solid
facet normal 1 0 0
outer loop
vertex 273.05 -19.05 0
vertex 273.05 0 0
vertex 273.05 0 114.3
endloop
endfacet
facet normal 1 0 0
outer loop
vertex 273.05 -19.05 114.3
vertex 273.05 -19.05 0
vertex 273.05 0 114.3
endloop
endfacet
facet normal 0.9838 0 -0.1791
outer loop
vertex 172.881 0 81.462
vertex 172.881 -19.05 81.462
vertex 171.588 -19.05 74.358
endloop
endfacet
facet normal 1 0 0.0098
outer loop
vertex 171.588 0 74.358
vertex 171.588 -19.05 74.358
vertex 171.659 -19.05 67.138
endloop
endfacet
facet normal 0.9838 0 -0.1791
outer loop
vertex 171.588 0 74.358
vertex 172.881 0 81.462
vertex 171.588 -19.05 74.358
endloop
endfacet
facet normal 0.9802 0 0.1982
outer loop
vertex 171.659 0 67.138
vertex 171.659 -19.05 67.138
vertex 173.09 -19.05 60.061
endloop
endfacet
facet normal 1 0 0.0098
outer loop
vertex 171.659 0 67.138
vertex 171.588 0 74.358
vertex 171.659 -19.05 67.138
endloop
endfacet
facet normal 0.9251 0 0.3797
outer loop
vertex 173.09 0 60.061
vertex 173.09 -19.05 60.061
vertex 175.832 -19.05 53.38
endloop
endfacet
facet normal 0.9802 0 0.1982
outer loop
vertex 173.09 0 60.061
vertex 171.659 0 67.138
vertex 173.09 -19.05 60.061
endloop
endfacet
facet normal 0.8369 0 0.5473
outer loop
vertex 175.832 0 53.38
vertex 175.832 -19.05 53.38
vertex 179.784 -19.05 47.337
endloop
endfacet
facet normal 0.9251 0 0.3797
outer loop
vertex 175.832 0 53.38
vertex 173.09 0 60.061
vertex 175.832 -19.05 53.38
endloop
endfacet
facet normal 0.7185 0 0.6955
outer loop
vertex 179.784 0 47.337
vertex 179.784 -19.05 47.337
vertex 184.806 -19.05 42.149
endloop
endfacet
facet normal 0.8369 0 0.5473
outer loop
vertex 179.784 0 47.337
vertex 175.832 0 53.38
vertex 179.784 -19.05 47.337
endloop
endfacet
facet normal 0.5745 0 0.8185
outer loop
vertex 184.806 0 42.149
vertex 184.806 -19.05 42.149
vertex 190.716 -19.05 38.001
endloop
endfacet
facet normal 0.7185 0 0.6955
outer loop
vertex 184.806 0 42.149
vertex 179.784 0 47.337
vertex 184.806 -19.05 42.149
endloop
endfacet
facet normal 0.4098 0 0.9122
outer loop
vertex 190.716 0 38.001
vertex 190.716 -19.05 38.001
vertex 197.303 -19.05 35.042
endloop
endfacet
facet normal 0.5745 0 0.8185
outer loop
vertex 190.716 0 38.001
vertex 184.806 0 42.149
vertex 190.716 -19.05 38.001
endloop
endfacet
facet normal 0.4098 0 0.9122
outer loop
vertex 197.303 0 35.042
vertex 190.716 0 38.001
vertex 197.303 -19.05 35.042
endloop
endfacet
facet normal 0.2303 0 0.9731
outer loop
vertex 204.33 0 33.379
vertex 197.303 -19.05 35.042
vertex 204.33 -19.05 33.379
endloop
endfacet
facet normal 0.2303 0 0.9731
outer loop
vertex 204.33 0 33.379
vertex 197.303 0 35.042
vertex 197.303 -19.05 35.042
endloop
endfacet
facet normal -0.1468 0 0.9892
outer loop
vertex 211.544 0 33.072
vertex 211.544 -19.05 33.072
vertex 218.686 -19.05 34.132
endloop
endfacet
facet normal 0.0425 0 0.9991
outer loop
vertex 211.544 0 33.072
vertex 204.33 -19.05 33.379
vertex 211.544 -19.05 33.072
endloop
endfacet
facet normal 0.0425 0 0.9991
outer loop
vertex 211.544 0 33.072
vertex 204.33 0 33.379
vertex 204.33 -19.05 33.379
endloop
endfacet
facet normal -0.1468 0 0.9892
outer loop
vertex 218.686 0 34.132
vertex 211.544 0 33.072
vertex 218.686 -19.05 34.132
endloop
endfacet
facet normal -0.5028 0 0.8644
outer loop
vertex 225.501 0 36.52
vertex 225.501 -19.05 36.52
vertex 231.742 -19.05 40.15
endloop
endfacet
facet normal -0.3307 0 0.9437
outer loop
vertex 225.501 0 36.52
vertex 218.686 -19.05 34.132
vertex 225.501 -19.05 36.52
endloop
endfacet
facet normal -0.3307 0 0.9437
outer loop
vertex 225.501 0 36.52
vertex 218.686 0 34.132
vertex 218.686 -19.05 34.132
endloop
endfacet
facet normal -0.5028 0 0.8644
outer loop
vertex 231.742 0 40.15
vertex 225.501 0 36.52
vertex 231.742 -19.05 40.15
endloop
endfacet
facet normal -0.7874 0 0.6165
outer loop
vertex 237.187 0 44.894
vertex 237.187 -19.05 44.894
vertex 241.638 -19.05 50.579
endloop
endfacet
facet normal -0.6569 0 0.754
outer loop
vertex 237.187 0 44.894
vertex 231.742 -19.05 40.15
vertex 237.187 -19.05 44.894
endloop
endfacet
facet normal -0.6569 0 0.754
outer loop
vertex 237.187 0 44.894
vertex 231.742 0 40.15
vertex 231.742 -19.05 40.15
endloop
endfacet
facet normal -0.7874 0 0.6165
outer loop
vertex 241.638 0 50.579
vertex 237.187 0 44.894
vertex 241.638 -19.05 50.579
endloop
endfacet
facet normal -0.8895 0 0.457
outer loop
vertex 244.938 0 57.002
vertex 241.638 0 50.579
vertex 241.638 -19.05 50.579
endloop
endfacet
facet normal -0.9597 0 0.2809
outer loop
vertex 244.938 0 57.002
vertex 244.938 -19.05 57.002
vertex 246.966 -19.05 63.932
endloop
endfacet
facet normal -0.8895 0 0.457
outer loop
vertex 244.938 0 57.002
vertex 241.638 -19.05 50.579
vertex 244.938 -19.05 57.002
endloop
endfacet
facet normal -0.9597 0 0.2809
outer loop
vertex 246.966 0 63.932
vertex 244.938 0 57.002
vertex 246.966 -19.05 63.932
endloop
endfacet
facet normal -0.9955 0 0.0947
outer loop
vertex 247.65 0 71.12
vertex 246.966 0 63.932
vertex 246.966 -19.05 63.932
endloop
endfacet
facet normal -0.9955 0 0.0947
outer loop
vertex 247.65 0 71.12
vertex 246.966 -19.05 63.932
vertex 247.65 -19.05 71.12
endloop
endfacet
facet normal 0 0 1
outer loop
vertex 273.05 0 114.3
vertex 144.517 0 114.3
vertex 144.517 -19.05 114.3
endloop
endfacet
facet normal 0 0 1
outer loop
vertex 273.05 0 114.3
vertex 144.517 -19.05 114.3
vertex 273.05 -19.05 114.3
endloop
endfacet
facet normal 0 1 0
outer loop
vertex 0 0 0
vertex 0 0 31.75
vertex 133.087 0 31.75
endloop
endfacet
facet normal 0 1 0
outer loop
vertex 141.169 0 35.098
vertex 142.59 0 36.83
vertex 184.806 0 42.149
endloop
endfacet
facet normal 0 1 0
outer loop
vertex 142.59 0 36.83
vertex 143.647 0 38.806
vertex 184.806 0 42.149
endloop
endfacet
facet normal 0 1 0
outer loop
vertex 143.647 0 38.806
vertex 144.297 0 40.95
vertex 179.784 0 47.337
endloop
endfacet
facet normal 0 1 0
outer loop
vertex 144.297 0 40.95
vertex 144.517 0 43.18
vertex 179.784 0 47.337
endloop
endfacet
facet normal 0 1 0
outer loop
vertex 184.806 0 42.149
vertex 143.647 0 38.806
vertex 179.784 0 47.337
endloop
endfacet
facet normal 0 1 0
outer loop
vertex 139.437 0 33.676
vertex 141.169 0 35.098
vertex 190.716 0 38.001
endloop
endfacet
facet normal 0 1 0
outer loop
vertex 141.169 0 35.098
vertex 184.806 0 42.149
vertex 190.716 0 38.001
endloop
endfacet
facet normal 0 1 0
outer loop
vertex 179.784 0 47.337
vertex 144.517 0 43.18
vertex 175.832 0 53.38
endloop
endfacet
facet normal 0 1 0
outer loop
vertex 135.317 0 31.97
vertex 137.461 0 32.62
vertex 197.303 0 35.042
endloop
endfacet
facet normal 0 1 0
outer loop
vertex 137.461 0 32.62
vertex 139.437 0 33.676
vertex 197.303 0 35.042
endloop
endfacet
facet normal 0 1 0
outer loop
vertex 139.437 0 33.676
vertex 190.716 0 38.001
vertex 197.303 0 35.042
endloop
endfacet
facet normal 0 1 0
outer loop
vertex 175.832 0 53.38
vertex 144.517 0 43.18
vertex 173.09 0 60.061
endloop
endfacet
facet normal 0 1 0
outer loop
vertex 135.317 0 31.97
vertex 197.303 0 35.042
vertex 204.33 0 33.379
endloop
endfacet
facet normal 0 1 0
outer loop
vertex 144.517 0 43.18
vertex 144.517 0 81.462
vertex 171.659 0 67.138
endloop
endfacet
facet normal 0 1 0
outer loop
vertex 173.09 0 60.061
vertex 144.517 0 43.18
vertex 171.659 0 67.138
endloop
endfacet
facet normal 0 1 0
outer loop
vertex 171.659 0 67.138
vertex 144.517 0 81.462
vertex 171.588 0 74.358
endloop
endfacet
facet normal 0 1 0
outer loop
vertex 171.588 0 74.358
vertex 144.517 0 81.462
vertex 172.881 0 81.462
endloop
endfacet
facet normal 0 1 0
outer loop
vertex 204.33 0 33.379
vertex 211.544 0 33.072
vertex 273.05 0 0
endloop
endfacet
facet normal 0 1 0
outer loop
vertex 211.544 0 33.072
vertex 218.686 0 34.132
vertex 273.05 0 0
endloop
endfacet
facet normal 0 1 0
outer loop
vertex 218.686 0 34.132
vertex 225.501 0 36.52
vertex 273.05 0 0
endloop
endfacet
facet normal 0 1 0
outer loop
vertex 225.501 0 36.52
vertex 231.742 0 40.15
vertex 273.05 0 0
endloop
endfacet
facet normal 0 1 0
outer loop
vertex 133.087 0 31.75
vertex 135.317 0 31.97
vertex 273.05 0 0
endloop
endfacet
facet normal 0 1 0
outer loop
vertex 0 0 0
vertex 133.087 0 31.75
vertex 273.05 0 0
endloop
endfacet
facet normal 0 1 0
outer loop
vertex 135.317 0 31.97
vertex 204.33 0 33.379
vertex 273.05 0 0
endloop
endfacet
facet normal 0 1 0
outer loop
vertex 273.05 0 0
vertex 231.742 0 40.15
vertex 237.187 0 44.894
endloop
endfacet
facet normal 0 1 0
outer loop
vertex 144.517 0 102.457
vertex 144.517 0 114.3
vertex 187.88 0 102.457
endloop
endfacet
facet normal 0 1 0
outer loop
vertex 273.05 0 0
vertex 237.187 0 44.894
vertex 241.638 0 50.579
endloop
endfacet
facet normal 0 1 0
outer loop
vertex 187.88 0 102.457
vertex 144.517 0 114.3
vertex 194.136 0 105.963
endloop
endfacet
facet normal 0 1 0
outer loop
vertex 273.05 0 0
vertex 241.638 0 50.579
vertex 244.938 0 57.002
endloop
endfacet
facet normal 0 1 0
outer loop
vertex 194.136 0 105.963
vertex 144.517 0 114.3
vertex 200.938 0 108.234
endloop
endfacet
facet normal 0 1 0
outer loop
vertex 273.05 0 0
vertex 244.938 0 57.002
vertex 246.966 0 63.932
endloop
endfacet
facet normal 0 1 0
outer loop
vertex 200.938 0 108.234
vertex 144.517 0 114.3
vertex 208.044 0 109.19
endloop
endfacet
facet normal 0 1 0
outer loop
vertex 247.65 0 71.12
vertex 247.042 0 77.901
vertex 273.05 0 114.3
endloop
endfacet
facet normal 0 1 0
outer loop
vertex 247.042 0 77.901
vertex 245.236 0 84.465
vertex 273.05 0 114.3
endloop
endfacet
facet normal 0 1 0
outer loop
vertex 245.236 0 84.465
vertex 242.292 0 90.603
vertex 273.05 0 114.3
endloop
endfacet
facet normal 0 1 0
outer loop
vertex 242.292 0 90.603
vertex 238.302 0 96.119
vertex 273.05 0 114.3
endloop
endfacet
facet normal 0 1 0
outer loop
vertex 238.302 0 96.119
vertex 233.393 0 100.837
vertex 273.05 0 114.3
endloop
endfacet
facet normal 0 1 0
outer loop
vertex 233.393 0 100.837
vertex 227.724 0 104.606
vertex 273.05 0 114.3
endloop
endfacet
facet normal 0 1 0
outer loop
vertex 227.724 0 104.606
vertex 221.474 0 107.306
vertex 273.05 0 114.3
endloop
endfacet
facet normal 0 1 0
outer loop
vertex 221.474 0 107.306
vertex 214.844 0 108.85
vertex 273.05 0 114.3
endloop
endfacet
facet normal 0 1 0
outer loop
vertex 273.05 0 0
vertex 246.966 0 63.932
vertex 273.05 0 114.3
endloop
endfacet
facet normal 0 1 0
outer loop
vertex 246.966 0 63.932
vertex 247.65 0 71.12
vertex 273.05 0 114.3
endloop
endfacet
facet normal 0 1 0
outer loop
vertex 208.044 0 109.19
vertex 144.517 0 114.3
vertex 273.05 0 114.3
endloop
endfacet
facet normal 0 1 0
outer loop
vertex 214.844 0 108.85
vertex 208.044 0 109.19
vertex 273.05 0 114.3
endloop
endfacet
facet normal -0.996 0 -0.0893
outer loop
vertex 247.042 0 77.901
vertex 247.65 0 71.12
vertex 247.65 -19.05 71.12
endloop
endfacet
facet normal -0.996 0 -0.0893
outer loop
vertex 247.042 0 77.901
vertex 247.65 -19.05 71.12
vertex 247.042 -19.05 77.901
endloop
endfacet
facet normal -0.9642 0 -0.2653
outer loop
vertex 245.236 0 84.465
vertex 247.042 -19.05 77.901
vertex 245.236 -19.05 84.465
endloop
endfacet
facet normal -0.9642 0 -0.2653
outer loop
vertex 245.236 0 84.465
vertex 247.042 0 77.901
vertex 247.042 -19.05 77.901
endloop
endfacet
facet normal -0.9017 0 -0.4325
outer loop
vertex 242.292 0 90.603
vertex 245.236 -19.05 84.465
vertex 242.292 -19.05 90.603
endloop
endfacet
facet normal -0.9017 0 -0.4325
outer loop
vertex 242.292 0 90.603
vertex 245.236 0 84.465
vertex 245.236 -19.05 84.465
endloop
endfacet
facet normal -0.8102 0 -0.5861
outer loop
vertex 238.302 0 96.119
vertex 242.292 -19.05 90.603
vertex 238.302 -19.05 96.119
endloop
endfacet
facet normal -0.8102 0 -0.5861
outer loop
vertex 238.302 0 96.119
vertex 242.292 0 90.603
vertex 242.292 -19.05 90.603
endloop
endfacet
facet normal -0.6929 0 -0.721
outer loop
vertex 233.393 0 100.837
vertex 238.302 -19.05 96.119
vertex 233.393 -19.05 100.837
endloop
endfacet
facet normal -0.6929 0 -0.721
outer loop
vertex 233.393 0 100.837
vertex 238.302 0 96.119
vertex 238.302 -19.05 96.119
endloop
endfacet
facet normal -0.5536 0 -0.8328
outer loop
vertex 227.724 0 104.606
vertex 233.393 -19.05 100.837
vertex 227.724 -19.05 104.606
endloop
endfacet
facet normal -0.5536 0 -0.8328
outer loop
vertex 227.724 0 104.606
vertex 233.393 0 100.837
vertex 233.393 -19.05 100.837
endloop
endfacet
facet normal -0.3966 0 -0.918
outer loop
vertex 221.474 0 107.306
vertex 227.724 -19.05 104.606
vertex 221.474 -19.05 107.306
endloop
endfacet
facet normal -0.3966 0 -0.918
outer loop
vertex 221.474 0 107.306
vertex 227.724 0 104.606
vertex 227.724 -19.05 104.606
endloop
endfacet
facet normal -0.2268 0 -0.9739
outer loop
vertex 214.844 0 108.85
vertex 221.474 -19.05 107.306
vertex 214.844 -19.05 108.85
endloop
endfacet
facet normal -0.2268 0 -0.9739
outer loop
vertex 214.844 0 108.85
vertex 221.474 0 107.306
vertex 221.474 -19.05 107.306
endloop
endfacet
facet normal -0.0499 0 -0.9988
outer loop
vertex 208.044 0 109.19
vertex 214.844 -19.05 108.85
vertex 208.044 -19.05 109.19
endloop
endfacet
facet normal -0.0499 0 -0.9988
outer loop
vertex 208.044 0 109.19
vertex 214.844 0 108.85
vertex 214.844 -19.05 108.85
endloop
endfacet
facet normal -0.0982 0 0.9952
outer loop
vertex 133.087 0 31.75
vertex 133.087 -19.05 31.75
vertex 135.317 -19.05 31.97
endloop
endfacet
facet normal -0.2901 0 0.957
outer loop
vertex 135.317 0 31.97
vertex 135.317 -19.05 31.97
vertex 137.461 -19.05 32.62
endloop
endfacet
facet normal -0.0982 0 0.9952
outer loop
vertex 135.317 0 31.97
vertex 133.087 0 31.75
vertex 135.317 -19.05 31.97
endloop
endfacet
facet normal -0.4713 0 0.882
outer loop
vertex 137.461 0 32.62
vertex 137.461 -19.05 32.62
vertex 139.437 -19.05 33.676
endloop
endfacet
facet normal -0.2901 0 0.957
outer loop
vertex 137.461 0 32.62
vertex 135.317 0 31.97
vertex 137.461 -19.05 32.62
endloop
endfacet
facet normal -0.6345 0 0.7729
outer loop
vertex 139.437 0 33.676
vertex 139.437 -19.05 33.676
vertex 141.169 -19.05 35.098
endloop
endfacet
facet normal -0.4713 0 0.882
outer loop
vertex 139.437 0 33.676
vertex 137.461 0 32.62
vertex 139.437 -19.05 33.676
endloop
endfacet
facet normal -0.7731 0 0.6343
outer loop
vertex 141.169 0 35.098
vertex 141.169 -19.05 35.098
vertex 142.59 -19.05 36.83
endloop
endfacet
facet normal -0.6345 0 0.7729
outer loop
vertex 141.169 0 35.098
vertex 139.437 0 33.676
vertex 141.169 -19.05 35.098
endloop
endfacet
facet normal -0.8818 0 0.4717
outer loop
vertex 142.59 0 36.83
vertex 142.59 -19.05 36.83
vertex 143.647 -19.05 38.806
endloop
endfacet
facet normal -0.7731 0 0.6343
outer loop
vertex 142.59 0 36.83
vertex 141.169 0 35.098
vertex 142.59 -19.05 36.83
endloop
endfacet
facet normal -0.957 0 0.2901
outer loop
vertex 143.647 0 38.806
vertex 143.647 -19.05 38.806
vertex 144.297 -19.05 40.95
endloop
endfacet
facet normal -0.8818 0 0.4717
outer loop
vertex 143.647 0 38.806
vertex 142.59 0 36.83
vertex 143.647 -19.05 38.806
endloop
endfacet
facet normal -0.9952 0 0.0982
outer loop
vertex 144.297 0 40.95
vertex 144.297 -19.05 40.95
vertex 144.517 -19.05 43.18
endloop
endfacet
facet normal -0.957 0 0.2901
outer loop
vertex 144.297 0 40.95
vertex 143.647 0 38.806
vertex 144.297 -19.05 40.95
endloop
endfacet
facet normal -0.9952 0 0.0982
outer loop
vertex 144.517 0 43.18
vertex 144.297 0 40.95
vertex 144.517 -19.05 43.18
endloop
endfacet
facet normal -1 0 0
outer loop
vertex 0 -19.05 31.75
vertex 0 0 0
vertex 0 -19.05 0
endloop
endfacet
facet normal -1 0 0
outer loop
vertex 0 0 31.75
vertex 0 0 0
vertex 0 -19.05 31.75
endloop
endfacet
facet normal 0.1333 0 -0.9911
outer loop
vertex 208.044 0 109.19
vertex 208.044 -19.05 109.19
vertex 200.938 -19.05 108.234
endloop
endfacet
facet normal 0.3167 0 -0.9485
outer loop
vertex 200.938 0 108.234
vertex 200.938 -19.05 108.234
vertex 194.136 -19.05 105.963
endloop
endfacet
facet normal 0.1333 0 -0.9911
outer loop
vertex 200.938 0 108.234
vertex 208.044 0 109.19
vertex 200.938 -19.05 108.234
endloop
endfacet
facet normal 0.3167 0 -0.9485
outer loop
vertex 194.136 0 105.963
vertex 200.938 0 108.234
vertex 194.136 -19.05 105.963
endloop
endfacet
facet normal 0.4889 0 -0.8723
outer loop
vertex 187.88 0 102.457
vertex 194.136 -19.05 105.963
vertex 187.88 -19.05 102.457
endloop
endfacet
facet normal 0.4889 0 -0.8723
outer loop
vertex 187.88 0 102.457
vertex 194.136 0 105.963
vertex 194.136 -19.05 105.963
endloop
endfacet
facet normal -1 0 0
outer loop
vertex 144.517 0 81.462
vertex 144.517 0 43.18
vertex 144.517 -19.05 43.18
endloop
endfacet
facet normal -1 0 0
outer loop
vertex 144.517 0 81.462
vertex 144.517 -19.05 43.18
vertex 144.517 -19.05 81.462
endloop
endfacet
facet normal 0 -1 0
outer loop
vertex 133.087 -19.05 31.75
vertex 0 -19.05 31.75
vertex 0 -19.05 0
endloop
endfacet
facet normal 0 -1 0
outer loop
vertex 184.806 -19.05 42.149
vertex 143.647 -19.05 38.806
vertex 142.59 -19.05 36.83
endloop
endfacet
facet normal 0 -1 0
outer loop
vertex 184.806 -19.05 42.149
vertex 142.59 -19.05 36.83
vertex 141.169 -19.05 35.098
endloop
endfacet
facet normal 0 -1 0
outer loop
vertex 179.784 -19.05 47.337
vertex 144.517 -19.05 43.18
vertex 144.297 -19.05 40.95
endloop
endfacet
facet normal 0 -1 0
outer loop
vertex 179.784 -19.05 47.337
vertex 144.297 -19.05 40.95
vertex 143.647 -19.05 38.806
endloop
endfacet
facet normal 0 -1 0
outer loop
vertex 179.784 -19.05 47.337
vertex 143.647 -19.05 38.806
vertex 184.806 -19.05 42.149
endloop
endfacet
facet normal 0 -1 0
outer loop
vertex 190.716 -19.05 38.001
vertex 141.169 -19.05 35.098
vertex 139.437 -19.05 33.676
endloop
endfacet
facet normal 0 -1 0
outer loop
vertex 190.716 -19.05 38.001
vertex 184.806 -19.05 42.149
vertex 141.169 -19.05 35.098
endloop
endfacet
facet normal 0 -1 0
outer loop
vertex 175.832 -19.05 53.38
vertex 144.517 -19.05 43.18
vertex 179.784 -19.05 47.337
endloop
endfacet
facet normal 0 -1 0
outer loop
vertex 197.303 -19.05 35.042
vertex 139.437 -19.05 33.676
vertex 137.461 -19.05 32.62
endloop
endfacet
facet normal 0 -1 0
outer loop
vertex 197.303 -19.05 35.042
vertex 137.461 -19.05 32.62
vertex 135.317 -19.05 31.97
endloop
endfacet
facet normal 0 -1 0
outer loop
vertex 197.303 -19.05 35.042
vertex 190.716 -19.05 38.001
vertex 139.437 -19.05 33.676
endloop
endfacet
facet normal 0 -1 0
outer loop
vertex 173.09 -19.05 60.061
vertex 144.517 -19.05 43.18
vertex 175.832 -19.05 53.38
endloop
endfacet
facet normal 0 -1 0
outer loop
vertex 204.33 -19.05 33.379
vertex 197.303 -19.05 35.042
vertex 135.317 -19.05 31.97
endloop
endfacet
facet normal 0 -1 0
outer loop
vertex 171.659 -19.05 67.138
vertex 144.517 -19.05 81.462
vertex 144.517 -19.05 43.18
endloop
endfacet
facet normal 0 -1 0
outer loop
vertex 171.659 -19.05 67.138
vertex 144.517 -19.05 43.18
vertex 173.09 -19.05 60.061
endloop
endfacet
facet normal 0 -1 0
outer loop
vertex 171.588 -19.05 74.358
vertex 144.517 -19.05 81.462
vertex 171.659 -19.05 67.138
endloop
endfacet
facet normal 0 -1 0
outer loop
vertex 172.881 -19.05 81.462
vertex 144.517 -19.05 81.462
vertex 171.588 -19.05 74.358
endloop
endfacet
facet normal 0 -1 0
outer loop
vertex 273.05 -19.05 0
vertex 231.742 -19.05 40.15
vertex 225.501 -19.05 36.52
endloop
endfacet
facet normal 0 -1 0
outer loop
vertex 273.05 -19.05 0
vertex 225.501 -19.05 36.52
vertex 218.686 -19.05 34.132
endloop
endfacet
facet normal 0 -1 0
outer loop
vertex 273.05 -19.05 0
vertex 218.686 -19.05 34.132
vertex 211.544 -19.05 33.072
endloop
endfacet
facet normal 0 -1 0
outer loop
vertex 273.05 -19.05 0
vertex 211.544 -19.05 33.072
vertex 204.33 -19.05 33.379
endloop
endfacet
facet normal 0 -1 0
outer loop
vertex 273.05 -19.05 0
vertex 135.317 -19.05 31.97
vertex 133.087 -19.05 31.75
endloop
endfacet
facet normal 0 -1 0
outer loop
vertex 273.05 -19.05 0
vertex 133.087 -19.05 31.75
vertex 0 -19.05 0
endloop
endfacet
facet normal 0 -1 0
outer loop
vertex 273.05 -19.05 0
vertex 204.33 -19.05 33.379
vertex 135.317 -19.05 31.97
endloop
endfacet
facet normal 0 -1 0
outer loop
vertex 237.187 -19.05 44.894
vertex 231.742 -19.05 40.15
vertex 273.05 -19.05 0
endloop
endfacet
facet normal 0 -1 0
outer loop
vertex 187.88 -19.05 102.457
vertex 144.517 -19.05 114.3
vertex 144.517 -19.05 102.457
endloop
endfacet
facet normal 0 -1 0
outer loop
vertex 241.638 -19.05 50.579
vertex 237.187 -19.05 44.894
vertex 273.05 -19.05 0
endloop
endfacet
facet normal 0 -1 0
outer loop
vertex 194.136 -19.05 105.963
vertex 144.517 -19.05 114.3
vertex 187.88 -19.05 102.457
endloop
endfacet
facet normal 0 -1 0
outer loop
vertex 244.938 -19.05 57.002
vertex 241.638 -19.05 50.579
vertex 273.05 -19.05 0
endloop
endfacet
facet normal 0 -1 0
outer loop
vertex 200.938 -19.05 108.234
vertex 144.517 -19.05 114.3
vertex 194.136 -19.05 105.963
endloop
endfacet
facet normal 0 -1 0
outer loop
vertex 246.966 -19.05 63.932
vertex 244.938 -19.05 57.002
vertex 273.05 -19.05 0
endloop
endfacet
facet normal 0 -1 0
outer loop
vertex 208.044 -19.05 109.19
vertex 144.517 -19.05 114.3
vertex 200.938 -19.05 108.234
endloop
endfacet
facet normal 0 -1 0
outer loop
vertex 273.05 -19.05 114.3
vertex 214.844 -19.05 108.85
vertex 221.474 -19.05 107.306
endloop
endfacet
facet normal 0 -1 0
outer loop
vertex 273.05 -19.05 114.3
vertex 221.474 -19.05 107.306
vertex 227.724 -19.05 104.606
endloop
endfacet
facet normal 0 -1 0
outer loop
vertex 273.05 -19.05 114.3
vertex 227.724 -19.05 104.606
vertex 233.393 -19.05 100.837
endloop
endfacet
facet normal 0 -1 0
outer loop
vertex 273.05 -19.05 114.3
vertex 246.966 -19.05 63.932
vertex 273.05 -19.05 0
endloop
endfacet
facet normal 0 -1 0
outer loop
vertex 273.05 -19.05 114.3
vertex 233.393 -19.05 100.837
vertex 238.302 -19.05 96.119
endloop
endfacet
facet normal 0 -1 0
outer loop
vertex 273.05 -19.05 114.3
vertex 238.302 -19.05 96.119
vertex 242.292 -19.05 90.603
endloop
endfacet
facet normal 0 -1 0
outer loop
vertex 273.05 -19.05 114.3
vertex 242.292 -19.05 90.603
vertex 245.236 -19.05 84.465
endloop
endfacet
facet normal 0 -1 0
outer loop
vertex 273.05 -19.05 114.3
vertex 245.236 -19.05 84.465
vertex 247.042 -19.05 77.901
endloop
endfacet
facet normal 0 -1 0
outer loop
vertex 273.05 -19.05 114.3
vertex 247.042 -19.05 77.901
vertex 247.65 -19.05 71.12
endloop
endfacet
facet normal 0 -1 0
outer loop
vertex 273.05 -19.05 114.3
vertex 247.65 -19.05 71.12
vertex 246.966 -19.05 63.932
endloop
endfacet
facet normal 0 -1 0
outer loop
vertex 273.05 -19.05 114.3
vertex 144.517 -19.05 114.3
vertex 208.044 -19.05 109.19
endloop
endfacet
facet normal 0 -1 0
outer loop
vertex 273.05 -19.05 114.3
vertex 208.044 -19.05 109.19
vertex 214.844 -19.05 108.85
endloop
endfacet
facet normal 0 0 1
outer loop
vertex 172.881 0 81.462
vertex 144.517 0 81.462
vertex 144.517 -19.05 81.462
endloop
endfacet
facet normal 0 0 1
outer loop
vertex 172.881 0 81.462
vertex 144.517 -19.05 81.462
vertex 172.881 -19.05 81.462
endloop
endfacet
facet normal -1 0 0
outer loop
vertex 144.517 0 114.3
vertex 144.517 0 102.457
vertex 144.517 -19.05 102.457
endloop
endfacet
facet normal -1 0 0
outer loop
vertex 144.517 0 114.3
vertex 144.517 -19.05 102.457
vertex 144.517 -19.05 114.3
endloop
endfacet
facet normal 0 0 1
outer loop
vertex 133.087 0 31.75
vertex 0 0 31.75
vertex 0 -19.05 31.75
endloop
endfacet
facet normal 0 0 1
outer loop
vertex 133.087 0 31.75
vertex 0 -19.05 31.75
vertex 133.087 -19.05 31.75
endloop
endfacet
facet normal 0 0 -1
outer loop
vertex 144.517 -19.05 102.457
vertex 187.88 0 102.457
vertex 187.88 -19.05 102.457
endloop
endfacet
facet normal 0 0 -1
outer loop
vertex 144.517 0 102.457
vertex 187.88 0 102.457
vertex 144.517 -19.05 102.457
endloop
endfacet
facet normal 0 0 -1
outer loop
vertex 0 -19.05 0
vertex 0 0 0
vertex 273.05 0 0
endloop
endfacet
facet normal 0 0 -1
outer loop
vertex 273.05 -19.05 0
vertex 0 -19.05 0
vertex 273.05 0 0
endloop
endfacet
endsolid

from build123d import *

# Parameters (mm, degrees)
F0_W     = 273.05
F0_H     = 114.3
F1_DEPTH = 19.05
F3_DEPTH = 25.4
F5_DEPTH = 25.4


with BuildPart() as f1:
    # F0 (on Front) → F1 (new body)
    with BuildSketch(Plane.XZ):
        with Locations((136.525, 57.15)):
            Rectangle(F0_W, F0_H)
    extrude(amount=F1_DEPTH)

    # F2 (on Front) → F3 (cut)
    with BuildSketch(Plane.XZ):
        with BuildLine():
            Line((144.5167429344, 115.0370560134), (0, 114.3))
            Line((0, 114.3), (0, 31.75))
            Line((0, 31.75), (133.0867429344, 31.75))
            ThreePointArc((133.0867429344, 31.75), (141.1689734434, 35.097769491), (144.5167429344, 43.18))
            Line((144.5167429344, 43.18), (144.5167429344, 82.55))
            Line((144.5167429344, 82.55), (157.2167429344, 82.55))
            Line((157.2167429344, 82.55), (157.2167429344, 102.3370560134))
            Line((157.2167429344, 102.3370560134), (144.5167429344, 102.3370560134))
            Line((144.5167429344, 102.3370560134), (144.5167429344, 115.0370560134))
        make_face()
    extrude(amount=F3_DEPTH, mode=Mode.SUBTRACT)

    # F4 (on Front) → F5 (cut)
    with BuildSketch(Plane.XZ):
        with BuildLine():
            ThreePointArc((172.8805950089, 81.4623758197), (204.3295752166, 33.3793433406), (247.65, 71.12))
            ThreePointArc((247.65, 71.12), (235.9531055724, 98.5879088416), (208.0444348487, 109.1902413123))
            ThreePointArc((208.0444348487, 109.1902413123), (197.4832243591, 107.2586624771), (187.8802183492, 102.4573668838))
            Line((187.8802183492, 102.4573668838), (192.520737648, 102.4573668838))
            Line((192.520737648, 102.4573668838), (192.520737648, 81.4623758197))
            Line((192.520737648, 81.4623758197), (172.8805950089, 81.4623758197))
        make_face()
        with BuildLine():
            Line((144.0413892269, 81.4623758197), (172.8805950089, 81.4623758197))
            ThreePointArc((172.8805950089, 81.4623758197), (178.5489905494, 93.26830497), (187.8802183492, 102.4573668838))
            Line((187.8802183492, 102.4573668838), (156.6383838654, 102.4573668838))
            Line((156.6383838654, 102.4573668838), (144.0413892269, 102.4573668838))
            Line((144.0413892269, 102.4573668838), (144.0413892269, 81.4623758197))
        make_face()
        with BuildLine():
            ThreePointArc((187.8802183492, 102.4573668838), (178.5489905494, 93.26830497), (172.8805950089, 81.4623758197))
            Line((172.8805950089, 81.4623758197), (192.520737648, 81.4623758197))
            Line((192.520737648, 81.4623758197), (192.520737648, 102.4573668838))
            Line((192.520737648, 102.4573668838), (187.8802183492, 102.4573668838))
        make_face()
    extrude(amount=F5_DEPTH, mode=Mode.SUBTRACT)


solid = f1.part
